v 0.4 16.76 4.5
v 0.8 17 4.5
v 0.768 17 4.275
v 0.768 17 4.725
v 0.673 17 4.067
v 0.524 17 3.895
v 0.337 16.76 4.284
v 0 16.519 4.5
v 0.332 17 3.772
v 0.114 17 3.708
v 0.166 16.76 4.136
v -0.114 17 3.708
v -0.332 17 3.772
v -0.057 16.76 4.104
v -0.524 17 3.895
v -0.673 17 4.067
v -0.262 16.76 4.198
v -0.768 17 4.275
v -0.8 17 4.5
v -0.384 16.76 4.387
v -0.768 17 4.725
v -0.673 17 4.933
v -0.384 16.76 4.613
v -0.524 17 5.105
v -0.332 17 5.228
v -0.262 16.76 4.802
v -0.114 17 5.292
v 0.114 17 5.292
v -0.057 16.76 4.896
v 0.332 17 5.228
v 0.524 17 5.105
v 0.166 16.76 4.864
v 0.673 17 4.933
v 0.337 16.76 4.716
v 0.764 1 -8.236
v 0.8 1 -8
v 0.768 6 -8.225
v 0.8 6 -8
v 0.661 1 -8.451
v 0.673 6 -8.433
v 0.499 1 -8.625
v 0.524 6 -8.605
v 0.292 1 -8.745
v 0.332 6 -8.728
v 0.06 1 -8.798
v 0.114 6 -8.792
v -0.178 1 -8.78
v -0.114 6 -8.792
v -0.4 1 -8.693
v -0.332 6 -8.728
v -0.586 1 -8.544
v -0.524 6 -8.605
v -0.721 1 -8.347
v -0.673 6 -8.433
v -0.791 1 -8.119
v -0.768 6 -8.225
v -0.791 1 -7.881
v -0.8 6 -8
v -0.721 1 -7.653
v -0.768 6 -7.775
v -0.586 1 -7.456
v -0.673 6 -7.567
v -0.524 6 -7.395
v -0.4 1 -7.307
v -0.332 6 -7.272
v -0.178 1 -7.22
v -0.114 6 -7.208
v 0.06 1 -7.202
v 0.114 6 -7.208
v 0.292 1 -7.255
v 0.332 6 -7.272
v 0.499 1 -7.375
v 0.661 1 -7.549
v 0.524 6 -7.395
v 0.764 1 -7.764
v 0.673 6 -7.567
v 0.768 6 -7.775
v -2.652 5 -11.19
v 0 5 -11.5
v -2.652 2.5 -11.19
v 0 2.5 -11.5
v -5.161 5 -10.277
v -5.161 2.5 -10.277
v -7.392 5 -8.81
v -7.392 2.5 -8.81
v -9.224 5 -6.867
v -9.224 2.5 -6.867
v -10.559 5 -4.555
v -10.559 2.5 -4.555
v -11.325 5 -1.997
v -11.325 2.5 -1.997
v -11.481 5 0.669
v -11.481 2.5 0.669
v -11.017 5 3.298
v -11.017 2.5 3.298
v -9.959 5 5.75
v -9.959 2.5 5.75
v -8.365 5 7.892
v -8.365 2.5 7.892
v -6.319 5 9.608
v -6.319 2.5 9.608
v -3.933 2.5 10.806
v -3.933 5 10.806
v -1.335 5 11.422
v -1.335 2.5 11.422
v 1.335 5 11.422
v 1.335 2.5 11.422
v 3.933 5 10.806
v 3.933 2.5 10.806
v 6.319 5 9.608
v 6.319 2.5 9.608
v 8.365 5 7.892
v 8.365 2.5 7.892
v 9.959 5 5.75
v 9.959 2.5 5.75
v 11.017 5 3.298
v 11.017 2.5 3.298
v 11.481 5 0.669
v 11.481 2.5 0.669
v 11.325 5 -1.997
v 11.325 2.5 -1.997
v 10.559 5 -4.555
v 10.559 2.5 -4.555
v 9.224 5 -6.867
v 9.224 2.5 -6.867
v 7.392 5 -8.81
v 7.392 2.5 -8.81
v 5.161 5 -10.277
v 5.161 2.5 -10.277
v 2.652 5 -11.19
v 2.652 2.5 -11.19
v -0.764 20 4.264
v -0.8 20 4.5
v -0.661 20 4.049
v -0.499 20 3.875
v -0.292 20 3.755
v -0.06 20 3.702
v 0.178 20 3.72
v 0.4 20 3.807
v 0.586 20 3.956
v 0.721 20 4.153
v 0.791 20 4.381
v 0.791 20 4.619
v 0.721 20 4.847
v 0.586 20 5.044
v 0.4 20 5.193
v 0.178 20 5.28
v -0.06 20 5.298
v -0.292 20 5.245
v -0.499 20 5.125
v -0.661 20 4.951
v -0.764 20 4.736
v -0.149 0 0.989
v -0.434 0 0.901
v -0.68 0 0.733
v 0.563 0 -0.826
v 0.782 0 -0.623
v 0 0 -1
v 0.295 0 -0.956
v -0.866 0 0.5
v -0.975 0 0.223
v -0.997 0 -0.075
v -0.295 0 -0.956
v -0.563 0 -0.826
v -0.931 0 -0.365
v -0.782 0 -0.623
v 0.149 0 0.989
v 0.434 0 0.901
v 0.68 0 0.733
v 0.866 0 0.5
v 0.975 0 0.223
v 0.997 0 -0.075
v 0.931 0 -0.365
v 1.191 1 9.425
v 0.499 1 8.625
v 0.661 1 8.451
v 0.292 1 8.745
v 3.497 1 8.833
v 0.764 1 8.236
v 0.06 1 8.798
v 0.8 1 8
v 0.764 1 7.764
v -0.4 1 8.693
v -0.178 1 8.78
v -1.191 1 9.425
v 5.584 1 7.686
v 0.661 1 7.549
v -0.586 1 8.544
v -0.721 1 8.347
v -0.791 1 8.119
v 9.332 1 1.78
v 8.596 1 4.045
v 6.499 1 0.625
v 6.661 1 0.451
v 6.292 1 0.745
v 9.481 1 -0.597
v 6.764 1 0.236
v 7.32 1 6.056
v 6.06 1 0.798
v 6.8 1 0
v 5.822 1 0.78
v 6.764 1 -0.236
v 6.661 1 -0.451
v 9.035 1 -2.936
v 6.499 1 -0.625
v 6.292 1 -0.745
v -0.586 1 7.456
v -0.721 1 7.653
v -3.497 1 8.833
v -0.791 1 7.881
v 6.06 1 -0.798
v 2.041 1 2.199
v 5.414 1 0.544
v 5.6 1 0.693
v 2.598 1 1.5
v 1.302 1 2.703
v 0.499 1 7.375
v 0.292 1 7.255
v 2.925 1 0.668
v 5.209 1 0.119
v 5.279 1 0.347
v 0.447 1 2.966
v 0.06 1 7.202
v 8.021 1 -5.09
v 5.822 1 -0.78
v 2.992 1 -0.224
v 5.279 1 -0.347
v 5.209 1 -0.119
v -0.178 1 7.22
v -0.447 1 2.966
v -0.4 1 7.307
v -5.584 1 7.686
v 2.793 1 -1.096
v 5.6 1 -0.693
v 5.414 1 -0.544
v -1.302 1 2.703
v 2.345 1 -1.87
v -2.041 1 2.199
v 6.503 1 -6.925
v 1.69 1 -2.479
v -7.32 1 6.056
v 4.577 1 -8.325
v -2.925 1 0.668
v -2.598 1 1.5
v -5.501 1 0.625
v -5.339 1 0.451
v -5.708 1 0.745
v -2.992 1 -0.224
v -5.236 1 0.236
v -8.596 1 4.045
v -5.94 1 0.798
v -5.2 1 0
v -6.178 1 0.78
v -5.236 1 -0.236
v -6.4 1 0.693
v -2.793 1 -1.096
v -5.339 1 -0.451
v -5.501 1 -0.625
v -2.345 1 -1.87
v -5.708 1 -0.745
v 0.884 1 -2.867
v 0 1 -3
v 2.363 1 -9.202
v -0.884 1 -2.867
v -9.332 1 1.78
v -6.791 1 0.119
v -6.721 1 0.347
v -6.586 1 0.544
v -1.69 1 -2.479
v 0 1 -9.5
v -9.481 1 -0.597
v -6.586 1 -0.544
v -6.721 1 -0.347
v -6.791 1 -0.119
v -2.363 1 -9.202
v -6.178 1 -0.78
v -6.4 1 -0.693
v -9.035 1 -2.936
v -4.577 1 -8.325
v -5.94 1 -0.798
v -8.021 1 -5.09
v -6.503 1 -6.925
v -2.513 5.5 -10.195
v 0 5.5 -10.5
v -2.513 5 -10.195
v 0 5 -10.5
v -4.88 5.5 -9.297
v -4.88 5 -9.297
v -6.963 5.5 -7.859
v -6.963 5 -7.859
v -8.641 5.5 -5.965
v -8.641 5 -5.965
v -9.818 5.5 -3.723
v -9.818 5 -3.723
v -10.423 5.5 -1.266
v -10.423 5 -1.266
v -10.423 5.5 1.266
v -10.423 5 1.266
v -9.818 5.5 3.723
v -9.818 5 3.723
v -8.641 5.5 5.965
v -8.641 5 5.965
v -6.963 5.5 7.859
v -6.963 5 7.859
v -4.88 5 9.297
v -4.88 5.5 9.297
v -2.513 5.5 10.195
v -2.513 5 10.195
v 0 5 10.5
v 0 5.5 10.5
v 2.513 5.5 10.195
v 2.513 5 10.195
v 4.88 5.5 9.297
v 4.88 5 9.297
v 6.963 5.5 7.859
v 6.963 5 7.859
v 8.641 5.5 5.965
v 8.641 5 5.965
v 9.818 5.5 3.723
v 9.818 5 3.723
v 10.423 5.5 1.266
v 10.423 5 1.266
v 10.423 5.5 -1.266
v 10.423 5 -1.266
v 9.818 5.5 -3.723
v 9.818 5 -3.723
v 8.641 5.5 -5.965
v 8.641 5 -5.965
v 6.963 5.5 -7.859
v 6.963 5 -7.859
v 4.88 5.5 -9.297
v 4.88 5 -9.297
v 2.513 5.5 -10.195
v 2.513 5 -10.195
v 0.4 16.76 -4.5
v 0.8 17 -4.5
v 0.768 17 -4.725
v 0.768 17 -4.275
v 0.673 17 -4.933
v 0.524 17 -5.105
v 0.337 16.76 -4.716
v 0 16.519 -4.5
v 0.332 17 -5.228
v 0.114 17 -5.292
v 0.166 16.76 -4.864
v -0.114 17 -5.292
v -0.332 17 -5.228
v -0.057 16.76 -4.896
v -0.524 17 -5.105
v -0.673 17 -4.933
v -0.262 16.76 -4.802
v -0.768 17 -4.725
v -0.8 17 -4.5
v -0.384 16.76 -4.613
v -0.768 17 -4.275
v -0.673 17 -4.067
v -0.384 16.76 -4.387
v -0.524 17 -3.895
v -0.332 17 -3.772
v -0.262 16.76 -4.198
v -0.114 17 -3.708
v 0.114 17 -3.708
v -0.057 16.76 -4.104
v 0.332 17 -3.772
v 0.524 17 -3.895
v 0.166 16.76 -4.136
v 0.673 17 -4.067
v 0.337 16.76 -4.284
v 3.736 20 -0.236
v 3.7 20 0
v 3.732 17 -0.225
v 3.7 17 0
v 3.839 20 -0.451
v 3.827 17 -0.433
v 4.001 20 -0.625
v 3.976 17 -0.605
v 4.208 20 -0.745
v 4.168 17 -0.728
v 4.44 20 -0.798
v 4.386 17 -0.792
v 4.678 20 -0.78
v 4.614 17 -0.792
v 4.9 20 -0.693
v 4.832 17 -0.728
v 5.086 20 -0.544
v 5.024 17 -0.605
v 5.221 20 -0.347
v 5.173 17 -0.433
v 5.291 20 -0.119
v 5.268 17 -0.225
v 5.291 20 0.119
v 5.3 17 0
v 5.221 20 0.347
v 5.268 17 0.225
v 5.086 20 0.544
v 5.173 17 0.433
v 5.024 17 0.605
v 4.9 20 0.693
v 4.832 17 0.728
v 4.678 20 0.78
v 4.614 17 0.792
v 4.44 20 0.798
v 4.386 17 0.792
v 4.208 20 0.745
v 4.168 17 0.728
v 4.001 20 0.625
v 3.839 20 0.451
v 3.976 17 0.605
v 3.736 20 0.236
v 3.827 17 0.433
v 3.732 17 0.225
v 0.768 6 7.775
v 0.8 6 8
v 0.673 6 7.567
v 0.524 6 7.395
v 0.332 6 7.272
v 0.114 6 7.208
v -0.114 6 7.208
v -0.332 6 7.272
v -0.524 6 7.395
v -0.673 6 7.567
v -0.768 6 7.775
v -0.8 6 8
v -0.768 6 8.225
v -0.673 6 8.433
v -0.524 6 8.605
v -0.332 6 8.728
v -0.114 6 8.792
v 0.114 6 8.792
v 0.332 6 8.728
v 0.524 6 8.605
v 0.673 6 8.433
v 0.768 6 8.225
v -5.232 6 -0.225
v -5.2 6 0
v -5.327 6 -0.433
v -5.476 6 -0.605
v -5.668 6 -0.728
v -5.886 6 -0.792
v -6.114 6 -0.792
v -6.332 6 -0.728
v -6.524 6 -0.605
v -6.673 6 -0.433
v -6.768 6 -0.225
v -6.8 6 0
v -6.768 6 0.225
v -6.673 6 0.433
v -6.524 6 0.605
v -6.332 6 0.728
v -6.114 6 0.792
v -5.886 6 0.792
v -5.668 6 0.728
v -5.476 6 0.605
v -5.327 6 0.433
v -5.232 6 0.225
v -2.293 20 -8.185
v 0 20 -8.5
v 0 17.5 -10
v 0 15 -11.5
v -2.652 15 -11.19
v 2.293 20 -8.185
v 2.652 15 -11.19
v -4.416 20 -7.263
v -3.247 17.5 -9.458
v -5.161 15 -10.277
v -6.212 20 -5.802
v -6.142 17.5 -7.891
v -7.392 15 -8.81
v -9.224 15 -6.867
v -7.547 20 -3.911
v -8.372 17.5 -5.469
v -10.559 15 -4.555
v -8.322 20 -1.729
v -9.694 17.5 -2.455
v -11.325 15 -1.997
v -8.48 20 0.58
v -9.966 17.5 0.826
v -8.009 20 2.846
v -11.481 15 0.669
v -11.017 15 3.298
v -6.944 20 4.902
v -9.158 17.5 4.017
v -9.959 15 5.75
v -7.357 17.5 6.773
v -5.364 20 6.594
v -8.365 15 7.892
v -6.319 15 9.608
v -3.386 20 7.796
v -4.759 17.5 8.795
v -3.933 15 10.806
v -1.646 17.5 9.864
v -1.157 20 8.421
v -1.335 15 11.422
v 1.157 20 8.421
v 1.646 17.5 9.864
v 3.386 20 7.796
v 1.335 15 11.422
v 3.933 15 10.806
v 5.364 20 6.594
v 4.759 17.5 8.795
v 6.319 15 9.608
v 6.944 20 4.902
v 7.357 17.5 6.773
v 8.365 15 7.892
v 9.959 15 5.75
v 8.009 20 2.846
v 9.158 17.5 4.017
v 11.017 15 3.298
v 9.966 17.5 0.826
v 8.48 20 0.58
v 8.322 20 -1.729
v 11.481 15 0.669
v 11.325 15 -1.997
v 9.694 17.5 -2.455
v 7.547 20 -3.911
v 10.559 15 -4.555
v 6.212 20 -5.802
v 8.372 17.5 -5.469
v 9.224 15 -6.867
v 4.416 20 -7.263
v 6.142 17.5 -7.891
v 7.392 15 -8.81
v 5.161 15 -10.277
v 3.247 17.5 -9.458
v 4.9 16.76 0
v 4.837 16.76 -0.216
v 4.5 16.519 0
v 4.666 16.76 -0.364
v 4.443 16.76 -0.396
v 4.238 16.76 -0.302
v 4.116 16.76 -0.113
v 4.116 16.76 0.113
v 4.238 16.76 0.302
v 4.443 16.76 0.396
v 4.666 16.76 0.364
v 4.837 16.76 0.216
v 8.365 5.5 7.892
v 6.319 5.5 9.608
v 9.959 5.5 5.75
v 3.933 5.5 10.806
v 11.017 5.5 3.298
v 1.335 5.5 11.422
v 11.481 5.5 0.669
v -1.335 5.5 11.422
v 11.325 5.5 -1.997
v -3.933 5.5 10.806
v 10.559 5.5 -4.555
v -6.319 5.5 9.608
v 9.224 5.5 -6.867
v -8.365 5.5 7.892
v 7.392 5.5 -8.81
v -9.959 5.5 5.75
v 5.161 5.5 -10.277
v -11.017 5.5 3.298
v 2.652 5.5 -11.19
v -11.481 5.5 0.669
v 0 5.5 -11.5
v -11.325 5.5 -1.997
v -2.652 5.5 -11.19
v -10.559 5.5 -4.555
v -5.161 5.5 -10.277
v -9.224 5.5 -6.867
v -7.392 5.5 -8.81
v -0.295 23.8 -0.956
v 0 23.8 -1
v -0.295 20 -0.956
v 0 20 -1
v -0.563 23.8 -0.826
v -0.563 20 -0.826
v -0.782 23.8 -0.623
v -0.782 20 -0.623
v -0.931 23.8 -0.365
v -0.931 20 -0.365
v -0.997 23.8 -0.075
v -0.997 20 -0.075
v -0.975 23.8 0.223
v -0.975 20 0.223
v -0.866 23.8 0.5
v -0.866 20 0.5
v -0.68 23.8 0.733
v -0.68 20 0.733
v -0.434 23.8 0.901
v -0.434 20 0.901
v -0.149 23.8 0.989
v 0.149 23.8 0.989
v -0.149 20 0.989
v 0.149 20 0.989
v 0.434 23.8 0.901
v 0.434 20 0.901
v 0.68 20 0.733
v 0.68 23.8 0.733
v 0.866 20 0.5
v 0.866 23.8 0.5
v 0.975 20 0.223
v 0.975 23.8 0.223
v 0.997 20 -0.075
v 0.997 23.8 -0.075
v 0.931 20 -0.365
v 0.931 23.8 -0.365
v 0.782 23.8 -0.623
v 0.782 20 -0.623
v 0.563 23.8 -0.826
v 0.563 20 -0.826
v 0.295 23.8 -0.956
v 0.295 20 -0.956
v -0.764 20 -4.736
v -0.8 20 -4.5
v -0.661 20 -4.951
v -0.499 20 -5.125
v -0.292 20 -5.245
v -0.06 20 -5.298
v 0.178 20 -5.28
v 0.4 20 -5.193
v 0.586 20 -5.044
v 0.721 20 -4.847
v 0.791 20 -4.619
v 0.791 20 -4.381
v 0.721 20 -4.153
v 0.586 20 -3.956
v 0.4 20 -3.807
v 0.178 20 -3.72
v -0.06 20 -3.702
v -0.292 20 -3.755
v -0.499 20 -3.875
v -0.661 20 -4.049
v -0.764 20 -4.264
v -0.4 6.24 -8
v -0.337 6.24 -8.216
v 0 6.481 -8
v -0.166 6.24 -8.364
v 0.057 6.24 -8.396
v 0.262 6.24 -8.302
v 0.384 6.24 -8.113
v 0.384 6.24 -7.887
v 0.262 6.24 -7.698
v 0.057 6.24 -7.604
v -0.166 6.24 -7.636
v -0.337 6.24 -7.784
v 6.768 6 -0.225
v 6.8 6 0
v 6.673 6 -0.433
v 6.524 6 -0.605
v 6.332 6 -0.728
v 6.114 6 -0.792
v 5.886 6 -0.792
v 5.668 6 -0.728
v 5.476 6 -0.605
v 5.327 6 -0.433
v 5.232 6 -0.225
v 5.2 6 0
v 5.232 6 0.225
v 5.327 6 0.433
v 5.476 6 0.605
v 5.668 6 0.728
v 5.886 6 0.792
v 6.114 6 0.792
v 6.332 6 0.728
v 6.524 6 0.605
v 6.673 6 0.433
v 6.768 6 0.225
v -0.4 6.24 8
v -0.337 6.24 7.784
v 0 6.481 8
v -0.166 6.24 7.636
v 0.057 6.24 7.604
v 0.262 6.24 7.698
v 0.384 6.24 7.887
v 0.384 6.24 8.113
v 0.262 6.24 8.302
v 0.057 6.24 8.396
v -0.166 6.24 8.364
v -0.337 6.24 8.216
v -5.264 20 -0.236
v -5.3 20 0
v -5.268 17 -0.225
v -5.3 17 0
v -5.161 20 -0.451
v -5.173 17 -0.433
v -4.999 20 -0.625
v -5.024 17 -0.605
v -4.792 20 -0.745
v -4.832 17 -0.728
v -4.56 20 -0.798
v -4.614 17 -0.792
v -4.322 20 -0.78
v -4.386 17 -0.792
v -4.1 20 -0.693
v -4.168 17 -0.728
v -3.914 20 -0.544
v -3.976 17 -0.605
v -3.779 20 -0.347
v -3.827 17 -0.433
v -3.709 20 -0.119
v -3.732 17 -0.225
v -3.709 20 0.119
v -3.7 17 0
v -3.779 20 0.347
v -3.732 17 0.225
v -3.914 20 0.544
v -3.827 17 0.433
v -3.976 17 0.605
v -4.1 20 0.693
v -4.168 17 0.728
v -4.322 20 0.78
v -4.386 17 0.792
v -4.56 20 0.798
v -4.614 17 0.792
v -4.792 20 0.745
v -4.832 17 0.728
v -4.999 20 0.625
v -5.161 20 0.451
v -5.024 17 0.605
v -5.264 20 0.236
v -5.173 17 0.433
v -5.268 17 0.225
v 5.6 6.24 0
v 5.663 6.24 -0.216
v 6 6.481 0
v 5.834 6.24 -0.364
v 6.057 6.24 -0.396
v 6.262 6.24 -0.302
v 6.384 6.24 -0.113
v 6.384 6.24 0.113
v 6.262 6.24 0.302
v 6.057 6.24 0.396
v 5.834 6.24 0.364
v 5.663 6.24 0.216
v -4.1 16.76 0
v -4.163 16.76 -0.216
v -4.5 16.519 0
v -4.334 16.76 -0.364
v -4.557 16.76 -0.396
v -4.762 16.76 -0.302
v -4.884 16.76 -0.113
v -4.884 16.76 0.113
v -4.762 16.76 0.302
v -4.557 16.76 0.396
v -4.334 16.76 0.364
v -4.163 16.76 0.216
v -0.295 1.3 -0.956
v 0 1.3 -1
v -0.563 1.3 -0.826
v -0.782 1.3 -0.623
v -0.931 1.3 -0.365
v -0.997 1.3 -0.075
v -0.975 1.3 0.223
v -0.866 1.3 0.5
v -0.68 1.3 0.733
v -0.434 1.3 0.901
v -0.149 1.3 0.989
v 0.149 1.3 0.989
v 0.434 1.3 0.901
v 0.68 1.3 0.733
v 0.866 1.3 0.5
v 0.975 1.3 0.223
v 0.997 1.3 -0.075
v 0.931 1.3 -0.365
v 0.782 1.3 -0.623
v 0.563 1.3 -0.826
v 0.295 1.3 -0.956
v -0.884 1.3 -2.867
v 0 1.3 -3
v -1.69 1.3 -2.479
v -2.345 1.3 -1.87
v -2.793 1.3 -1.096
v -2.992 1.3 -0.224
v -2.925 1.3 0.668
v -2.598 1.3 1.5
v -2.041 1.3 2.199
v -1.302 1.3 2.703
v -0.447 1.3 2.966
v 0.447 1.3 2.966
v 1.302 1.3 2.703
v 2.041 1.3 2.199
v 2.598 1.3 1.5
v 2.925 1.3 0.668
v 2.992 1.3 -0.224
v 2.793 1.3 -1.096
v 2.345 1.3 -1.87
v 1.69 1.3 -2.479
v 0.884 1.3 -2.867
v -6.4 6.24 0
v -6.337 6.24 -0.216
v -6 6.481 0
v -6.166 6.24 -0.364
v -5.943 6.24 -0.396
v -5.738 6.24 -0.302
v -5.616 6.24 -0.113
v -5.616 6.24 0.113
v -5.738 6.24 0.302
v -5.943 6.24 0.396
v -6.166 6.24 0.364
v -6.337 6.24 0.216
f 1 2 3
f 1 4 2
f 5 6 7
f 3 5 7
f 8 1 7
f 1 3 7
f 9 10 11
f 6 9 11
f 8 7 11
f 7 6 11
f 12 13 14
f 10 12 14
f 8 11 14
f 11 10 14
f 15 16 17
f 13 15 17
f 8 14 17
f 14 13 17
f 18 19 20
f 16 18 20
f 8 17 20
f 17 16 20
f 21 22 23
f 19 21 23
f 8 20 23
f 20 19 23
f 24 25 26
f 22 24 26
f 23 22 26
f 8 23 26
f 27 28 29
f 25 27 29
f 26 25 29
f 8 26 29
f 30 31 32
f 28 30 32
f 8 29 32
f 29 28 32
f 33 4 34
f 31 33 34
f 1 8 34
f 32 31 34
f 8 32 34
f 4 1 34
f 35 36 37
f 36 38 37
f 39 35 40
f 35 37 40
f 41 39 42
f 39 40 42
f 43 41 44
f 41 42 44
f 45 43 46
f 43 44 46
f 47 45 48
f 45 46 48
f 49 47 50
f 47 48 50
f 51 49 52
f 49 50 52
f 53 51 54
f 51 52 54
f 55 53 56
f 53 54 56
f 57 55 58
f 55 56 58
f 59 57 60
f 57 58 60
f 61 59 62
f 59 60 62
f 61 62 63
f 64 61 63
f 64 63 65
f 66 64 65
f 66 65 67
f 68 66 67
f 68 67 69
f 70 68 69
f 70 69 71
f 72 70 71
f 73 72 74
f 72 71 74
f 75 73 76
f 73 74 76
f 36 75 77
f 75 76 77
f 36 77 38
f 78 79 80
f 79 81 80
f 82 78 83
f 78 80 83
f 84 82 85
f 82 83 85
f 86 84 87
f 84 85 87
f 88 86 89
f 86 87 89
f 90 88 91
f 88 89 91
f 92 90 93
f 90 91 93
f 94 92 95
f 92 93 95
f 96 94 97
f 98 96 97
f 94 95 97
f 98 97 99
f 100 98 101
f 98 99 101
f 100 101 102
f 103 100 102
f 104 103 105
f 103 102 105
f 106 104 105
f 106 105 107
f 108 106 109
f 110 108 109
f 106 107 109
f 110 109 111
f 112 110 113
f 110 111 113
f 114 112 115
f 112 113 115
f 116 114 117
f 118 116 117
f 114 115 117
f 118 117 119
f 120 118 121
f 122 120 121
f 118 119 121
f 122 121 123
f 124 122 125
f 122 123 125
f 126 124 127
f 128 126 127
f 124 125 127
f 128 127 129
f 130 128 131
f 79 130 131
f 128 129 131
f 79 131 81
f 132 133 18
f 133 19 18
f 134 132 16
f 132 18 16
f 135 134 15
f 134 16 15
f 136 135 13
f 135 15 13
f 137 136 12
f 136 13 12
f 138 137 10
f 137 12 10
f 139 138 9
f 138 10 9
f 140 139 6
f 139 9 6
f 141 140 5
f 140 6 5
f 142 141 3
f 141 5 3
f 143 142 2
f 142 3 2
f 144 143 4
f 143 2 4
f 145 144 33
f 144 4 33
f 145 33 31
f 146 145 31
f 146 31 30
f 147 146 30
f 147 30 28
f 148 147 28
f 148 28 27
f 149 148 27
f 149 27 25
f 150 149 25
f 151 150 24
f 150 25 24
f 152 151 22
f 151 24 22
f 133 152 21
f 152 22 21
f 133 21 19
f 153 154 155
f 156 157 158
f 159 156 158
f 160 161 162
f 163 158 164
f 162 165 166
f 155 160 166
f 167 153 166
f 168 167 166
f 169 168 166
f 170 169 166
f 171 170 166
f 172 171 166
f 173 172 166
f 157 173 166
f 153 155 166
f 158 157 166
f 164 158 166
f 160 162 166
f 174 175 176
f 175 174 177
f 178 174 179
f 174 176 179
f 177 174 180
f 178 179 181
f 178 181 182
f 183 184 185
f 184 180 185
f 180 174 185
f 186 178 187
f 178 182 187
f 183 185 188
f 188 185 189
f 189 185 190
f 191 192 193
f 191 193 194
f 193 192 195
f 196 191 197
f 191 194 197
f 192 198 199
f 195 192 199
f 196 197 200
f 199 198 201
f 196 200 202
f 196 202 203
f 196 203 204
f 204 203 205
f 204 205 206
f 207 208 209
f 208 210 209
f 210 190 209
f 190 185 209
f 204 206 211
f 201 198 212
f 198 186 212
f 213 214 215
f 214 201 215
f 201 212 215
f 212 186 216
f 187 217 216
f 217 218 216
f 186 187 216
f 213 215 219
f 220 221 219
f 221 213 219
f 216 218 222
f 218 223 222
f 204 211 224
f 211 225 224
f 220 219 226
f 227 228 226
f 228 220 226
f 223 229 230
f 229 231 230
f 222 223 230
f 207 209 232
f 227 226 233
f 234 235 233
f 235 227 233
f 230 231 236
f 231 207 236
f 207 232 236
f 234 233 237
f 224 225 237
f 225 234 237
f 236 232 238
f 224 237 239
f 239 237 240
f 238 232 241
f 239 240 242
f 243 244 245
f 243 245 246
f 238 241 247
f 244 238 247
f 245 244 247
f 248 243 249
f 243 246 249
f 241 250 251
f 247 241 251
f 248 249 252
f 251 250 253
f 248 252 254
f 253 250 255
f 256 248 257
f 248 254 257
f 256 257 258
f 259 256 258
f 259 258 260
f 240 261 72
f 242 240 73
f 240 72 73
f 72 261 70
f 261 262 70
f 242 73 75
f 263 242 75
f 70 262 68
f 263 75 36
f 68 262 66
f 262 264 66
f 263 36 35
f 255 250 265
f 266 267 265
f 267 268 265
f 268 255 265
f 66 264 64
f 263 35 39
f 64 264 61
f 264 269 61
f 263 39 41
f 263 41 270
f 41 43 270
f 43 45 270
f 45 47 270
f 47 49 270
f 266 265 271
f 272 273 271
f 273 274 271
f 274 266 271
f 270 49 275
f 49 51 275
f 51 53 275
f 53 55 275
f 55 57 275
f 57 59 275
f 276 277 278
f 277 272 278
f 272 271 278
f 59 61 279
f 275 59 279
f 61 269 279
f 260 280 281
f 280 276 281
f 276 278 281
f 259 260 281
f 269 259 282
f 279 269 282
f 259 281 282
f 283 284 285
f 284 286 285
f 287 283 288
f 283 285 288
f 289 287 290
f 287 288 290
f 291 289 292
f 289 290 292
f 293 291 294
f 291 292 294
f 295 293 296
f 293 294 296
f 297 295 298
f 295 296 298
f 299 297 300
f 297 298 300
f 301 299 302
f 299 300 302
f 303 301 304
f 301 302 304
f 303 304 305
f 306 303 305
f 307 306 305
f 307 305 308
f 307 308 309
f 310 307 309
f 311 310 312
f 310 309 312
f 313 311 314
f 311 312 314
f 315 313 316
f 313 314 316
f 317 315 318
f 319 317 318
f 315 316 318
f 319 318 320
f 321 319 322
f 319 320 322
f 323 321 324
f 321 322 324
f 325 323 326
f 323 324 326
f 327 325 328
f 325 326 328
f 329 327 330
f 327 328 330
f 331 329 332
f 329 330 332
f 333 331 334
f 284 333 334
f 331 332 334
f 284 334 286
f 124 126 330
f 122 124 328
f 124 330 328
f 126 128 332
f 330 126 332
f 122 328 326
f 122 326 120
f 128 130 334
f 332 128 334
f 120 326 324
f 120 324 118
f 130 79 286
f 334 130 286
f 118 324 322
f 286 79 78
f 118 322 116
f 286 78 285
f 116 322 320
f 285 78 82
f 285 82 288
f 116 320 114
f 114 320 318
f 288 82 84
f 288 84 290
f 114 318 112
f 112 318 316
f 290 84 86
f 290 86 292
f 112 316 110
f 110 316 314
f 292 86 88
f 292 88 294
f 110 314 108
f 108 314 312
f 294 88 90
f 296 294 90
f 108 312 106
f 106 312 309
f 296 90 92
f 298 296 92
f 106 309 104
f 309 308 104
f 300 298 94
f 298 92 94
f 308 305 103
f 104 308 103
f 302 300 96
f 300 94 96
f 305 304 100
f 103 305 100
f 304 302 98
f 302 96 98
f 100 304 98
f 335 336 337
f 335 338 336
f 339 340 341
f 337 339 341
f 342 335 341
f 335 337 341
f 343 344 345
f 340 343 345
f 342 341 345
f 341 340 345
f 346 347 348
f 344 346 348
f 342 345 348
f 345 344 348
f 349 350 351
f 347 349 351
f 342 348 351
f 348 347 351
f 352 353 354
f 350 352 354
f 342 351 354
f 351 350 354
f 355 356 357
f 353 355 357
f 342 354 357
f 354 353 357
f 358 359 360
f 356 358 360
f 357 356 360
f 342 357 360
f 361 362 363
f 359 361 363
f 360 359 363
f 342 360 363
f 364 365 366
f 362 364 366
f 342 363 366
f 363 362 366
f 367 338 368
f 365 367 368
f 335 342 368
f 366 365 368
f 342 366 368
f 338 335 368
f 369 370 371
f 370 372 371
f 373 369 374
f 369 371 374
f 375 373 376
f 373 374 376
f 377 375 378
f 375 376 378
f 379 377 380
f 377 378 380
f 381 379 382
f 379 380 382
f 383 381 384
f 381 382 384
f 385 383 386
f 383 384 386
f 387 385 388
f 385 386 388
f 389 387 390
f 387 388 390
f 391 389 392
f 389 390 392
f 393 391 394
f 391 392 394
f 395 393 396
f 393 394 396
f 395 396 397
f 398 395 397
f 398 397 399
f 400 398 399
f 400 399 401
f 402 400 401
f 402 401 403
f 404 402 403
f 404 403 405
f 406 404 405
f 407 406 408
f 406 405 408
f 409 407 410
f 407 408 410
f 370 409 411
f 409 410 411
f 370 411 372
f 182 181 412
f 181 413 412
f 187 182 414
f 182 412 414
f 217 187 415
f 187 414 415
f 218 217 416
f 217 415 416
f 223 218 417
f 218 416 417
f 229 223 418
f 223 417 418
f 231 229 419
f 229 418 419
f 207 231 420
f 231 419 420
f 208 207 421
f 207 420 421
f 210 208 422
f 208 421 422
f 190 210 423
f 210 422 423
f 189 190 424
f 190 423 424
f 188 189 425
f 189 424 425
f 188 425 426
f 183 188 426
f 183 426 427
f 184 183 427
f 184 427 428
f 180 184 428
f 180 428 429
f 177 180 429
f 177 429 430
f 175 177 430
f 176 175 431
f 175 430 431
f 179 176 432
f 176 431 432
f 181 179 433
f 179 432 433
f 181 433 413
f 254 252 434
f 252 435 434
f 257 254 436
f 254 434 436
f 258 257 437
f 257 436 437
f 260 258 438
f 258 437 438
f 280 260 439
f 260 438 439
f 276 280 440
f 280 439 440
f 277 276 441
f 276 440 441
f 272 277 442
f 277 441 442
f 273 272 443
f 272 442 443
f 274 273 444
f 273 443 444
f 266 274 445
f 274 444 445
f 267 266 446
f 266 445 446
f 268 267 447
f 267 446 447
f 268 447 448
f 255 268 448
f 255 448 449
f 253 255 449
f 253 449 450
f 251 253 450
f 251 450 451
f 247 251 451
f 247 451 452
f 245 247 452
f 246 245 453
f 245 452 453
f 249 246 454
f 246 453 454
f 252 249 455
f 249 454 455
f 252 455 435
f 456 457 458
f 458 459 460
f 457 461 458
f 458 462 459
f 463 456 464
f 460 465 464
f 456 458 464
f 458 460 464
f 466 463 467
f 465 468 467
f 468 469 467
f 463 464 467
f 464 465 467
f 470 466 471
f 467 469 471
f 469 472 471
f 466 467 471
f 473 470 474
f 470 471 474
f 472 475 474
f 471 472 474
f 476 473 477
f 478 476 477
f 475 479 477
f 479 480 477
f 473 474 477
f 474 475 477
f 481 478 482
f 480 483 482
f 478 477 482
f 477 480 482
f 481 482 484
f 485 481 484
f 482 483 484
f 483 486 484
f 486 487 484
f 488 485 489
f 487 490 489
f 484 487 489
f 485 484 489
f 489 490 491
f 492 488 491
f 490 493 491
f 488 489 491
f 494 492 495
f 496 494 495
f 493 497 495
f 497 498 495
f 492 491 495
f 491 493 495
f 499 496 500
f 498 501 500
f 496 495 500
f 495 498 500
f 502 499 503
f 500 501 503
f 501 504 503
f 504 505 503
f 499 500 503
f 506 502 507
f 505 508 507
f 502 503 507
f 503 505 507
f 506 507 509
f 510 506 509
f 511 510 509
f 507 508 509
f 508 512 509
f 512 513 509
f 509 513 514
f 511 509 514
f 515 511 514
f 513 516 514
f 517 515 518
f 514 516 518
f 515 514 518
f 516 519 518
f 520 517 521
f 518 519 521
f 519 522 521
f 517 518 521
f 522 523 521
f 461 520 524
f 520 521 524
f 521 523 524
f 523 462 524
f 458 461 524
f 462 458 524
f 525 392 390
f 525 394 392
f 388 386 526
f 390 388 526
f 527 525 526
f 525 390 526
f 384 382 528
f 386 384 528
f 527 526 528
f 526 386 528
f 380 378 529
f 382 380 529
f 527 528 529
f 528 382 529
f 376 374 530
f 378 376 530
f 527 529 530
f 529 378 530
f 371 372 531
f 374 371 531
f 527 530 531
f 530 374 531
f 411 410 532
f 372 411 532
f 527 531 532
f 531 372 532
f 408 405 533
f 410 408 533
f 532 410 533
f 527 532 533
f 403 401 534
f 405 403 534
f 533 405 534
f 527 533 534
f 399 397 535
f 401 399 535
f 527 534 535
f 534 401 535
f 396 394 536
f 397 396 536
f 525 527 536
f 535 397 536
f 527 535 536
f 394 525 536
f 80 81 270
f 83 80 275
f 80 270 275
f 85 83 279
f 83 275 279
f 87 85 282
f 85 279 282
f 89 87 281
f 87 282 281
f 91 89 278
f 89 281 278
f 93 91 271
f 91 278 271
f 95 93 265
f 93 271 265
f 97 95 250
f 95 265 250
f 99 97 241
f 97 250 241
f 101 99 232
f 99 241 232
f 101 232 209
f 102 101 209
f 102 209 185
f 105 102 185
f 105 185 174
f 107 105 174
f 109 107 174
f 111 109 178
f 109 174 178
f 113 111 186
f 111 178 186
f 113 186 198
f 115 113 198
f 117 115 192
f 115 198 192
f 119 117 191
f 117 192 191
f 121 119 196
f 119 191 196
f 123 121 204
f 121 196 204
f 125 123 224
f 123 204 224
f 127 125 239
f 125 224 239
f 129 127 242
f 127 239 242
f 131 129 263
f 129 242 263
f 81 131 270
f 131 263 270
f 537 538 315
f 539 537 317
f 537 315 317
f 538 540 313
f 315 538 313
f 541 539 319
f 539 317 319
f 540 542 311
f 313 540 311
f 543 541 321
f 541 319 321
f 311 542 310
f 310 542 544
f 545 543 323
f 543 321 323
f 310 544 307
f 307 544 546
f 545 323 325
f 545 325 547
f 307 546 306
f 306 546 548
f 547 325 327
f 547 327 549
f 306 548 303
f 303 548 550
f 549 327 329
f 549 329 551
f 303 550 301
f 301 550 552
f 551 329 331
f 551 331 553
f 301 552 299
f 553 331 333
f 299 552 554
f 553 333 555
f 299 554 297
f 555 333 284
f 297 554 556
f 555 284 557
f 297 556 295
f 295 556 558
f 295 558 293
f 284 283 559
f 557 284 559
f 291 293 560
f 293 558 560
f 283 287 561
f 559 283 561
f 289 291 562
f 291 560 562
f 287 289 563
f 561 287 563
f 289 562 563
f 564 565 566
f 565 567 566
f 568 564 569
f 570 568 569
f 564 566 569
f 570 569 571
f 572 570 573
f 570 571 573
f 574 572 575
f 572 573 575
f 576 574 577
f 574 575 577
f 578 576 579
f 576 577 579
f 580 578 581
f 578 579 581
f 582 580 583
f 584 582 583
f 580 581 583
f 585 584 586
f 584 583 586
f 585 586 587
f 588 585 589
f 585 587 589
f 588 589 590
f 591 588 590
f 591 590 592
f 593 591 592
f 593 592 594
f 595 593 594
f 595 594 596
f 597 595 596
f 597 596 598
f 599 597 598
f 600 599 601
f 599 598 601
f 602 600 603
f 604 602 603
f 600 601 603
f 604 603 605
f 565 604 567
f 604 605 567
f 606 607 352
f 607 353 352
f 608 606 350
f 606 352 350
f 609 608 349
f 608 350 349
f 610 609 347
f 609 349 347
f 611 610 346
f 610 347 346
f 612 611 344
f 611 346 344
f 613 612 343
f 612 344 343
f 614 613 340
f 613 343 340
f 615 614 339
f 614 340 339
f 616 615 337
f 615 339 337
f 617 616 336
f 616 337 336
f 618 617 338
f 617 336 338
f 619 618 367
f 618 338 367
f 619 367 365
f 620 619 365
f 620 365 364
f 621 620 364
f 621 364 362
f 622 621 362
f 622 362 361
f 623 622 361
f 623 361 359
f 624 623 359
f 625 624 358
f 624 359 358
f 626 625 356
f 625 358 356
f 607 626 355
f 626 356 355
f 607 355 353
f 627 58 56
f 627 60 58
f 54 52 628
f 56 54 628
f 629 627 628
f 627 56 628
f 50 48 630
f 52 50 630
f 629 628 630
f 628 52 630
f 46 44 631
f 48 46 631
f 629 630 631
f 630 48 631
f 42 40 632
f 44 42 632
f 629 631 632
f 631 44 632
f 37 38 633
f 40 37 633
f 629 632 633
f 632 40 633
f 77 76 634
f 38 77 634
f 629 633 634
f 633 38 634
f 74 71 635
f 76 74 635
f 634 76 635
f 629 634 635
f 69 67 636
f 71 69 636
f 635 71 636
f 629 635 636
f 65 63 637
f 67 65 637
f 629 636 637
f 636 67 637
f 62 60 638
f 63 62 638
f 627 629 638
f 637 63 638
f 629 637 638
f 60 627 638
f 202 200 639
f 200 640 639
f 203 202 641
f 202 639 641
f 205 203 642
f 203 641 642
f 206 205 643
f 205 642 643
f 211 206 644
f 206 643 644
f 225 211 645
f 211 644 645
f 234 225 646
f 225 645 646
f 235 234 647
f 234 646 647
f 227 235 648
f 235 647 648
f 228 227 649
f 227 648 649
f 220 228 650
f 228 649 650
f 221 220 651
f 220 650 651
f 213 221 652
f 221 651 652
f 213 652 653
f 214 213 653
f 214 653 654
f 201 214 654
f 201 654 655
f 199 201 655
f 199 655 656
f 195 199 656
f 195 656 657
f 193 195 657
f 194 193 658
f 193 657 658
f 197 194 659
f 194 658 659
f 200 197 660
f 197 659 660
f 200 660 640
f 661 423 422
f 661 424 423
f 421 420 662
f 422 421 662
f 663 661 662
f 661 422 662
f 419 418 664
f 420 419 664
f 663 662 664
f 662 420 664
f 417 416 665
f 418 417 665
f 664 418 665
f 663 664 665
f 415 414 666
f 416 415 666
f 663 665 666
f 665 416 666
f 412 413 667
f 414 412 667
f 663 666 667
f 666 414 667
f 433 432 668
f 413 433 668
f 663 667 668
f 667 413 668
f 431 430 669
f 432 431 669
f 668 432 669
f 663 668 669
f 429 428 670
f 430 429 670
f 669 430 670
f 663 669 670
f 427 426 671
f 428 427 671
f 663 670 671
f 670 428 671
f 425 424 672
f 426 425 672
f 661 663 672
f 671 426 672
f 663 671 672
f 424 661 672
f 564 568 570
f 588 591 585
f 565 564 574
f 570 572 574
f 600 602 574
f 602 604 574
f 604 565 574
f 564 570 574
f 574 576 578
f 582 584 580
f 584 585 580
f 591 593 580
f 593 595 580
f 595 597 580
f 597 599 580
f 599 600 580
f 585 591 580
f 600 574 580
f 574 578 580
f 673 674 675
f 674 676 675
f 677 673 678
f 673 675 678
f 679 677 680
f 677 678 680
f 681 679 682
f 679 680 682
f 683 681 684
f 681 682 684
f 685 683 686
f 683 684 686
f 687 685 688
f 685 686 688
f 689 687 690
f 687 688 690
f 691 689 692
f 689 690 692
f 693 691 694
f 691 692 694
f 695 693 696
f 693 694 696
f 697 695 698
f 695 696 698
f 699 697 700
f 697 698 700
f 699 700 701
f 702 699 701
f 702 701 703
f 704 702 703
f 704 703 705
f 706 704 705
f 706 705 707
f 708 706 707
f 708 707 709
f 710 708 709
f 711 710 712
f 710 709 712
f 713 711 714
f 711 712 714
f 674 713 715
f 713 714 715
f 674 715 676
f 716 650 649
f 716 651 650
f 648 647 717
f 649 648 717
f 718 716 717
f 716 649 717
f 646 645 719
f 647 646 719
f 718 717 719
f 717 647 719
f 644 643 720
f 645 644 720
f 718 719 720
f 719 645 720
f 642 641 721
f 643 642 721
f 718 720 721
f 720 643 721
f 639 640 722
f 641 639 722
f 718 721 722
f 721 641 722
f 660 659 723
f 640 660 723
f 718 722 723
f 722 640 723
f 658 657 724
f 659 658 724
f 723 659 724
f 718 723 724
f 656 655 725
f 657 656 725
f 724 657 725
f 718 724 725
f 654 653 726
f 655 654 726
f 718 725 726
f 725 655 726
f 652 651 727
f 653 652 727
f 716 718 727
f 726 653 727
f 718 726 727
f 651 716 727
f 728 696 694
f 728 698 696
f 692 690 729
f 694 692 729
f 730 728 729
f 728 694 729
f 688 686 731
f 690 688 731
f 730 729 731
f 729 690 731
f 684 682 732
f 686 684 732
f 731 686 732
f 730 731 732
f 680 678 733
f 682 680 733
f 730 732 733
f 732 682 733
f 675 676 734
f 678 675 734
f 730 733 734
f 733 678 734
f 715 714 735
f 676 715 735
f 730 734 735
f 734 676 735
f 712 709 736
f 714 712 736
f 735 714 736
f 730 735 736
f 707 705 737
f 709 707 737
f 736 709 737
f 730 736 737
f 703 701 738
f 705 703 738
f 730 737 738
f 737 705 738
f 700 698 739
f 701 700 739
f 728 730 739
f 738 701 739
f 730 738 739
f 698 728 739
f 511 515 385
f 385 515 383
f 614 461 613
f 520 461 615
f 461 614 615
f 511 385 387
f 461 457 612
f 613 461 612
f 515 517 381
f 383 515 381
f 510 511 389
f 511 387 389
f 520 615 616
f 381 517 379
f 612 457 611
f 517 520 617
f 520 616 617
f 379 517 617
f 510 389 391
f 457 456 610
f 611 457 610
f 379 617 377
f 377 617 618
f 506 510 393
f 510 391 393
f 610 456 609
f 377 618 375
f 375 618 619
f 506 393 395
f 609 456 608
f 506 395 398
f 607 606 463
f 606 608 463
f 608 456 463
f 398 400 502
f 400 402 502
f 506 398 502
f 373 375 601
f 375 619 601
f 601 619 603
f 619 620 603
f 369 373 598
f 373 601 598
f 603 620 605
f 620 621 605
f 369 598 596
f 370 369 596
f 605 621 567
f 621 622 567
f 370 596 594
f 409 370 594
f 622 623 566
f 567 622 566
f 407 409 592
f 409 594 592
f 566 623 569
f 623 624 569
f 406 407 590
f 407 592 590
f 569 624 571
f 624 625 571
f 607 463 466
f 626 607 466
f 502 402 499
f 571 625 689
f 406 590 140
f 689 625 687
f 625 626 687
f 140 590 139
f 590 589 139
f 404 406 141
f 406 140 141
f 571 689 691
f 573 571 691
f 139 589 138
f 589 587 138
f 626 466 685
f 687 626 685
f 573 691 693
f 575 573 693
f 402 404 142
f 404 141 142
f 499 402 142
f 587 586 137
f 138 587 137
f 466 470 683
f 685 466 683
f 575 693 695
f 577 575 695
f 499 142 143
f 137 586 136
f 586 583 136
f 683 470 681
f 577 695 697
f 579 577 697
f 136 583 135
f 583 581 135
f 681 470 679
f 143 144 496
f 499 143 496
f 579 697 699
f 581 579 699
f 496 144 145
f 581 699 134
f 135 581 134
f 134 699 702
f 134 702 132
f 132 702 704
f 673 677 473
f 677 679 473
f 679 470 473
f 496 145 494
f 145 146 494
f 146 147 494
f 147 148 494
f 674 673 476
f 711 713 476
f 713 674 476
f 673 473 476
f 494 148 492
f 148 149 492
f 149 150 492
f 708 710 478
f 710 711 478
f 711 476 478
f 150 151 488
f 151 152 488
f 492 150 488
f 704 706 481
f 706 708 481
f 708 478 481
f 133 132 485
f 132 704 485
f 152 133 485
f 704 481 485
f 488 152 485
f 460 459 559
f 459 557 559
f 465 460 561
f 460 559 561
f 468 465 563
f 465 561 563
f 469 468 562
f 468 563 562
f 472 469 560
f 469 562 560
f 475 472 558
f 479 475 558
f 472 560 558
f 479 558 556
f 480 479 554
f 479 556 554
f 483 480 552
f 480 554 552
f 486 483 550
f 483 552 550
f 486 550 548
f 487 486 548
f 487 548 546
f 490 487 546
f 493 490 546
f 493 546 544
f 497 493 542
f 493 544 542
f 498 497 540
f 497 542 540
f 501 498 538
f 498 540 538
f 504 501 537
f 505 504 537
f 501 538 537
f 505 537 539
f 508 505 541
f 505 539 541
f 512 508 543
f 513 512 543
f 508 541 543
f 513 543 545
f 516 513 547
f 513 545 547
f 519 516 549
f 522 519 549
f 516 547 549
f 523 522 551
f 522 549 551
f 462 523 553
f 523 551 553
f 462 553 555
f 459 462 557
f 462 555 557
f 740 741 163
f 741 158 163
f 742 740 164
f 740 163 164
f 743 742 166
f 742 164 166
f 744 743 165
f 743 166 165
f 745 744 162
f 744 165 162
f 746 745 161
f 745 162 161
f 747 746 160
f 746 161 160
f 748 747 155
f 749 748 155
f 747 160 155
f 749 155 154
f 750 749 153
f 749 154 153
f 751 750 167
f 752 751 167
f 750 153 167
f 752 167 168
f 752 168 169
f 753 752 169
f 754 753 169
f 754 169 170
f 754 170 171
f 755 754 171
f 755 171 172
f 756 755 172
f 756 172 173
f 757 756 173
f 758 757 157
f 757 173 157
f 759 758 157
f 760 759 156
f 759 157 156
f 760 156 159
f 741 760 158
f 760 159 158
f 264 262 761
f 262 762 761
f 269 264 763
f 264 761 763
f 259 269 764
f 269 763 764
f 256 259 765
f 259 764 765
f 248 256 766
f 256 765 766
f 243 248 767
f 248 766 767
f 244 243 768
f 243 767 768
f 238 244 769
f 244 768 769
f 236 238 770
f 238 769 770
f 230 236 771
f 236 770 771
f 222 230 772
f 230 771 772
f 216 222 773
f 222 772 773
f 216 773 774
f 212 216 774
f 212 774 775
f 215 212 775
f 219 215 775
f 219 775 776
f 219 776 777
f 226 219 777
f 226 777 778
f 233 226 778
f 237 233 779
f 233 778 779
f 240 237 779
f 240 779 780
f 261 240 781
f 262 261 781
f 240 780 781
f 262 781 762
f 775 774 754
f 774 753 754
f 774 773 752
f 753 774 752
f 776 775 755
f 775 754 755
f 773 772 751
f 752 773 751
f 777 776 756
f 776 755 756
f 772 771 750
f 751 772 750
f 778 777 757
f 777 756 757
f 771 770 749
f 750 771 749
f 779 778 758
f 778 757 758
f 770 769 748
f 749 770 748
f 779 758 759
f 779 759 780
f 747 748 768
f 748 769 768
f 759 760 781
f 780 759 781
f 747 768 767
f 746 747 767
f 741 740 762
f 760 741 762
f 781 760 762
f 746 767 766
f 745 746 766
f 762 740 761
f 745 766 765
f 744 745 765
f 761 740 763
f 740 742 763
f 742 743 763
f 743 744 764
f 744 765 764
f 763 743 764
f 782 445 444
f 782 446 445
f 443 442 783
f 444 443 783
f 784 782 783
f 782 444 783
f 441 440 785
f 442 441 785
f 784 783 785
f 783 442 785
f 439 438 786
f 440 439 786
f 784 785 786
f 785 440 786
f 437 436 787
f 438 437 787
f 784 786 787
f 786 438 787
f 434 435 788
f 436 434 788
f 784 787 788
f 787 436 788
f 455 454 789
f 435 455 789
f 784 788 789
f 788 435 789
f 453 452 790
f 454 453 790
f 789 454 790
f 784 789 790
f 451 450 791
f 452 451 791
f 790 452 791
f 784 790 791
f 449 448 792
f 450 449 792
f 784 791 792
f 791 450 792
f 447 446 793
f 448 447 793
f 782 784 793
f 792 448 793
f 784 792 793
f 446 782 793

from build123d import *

# Parameters (mm, degrees)
M2_GEWINDEBOHRUNG1_D     = 1.6
M2_GEWINDEBOHRUNG1_DEPTH = 3
M2_GEWINDEBOHRUNG1_TIP   = 0.480688495
M2_GEWINDEBOHRUNG2_D     = 1.6
M2_GEWINDEBOHRUNG2_DEPTH = 5
M2_GEWINDEBOHRUNG2_TIP   = 0.480688495


with BuildPart() as part:
    # Skizze1 → Rotation1 (revolve)
    with BuildSketch(Plane.XY, mode=Mode.PRIVATE) as rotation1_sk:
        Polygon((9.5, 1), (3, 1), (3, 1.3), (1, 1.3), (1, 0), (0, 0), (0, 23.8), (1, 23.8), (1, 20), (8.5, 20), (11.5, 15), (11.5, 5.5), (10.5, 5.5), (10.5, 5), (11.5, 5), (11.5, 2.5), align=None)
    revolve(rotation1_sk.sketch.rotate(Axis((0, 0, 0), (0, 1, 0)), 90), axis=Axis((0, 0, 0), (0, 1, 0)))

    # M2 Gewindebohrung1
    with Locations(Plane(origin=(0, 20, 0), x_dir=(1, 0, 0), z_dir=(0, 1, 0))):
        with Locations((-4.5, 0), (0, 4.5), (4.5, 0), (0, -4.5)):
            Hole(M2_GEWINDEBOHRUNG1_D / 2, depth=M2_GEWINDEBOHRUNG1_DEPTH)
            with Locations((0, 0, -(M2_GEWINDEBOHRUNG1_DEPTH + M2_GEWINDEBOHRUNG1_TIP / 2))):  # 118° drill point
                Cone(0, M2_GEWINDEBOHRUNG1_D / 2, M2_GEWINDEBOHRUNG1_TIP, mode=Mode.SUBTRACT)

    # M2 Gewindebohrung2
    with Locations(Plane(origin=(0, 1, 0), x_dir=(-1, 0, 0), z_dir=(0, -1, 0))):
        with Locations((0, 8), (0, -8), (6, 0), (-6, 0)):
            Hole(M2_GEWINDEBOHRUNG2_D / 2, depth=M2_GEWINDEBOHRUNG2_DEPTH)
            with Locations((0, 0, -(M2_GEWINDEBOHRUNG2_DEPTH + M2_GEWINDEBOHRUNG2_TIP / 2))):  # 118° drill point
                Cone(0, M2_GEWINDEBOHRUNG2_D / 2, M2_GEWINDEBOHRUNG2_TIP, mode=Mode.SUBTRACT)


solid = part.part
